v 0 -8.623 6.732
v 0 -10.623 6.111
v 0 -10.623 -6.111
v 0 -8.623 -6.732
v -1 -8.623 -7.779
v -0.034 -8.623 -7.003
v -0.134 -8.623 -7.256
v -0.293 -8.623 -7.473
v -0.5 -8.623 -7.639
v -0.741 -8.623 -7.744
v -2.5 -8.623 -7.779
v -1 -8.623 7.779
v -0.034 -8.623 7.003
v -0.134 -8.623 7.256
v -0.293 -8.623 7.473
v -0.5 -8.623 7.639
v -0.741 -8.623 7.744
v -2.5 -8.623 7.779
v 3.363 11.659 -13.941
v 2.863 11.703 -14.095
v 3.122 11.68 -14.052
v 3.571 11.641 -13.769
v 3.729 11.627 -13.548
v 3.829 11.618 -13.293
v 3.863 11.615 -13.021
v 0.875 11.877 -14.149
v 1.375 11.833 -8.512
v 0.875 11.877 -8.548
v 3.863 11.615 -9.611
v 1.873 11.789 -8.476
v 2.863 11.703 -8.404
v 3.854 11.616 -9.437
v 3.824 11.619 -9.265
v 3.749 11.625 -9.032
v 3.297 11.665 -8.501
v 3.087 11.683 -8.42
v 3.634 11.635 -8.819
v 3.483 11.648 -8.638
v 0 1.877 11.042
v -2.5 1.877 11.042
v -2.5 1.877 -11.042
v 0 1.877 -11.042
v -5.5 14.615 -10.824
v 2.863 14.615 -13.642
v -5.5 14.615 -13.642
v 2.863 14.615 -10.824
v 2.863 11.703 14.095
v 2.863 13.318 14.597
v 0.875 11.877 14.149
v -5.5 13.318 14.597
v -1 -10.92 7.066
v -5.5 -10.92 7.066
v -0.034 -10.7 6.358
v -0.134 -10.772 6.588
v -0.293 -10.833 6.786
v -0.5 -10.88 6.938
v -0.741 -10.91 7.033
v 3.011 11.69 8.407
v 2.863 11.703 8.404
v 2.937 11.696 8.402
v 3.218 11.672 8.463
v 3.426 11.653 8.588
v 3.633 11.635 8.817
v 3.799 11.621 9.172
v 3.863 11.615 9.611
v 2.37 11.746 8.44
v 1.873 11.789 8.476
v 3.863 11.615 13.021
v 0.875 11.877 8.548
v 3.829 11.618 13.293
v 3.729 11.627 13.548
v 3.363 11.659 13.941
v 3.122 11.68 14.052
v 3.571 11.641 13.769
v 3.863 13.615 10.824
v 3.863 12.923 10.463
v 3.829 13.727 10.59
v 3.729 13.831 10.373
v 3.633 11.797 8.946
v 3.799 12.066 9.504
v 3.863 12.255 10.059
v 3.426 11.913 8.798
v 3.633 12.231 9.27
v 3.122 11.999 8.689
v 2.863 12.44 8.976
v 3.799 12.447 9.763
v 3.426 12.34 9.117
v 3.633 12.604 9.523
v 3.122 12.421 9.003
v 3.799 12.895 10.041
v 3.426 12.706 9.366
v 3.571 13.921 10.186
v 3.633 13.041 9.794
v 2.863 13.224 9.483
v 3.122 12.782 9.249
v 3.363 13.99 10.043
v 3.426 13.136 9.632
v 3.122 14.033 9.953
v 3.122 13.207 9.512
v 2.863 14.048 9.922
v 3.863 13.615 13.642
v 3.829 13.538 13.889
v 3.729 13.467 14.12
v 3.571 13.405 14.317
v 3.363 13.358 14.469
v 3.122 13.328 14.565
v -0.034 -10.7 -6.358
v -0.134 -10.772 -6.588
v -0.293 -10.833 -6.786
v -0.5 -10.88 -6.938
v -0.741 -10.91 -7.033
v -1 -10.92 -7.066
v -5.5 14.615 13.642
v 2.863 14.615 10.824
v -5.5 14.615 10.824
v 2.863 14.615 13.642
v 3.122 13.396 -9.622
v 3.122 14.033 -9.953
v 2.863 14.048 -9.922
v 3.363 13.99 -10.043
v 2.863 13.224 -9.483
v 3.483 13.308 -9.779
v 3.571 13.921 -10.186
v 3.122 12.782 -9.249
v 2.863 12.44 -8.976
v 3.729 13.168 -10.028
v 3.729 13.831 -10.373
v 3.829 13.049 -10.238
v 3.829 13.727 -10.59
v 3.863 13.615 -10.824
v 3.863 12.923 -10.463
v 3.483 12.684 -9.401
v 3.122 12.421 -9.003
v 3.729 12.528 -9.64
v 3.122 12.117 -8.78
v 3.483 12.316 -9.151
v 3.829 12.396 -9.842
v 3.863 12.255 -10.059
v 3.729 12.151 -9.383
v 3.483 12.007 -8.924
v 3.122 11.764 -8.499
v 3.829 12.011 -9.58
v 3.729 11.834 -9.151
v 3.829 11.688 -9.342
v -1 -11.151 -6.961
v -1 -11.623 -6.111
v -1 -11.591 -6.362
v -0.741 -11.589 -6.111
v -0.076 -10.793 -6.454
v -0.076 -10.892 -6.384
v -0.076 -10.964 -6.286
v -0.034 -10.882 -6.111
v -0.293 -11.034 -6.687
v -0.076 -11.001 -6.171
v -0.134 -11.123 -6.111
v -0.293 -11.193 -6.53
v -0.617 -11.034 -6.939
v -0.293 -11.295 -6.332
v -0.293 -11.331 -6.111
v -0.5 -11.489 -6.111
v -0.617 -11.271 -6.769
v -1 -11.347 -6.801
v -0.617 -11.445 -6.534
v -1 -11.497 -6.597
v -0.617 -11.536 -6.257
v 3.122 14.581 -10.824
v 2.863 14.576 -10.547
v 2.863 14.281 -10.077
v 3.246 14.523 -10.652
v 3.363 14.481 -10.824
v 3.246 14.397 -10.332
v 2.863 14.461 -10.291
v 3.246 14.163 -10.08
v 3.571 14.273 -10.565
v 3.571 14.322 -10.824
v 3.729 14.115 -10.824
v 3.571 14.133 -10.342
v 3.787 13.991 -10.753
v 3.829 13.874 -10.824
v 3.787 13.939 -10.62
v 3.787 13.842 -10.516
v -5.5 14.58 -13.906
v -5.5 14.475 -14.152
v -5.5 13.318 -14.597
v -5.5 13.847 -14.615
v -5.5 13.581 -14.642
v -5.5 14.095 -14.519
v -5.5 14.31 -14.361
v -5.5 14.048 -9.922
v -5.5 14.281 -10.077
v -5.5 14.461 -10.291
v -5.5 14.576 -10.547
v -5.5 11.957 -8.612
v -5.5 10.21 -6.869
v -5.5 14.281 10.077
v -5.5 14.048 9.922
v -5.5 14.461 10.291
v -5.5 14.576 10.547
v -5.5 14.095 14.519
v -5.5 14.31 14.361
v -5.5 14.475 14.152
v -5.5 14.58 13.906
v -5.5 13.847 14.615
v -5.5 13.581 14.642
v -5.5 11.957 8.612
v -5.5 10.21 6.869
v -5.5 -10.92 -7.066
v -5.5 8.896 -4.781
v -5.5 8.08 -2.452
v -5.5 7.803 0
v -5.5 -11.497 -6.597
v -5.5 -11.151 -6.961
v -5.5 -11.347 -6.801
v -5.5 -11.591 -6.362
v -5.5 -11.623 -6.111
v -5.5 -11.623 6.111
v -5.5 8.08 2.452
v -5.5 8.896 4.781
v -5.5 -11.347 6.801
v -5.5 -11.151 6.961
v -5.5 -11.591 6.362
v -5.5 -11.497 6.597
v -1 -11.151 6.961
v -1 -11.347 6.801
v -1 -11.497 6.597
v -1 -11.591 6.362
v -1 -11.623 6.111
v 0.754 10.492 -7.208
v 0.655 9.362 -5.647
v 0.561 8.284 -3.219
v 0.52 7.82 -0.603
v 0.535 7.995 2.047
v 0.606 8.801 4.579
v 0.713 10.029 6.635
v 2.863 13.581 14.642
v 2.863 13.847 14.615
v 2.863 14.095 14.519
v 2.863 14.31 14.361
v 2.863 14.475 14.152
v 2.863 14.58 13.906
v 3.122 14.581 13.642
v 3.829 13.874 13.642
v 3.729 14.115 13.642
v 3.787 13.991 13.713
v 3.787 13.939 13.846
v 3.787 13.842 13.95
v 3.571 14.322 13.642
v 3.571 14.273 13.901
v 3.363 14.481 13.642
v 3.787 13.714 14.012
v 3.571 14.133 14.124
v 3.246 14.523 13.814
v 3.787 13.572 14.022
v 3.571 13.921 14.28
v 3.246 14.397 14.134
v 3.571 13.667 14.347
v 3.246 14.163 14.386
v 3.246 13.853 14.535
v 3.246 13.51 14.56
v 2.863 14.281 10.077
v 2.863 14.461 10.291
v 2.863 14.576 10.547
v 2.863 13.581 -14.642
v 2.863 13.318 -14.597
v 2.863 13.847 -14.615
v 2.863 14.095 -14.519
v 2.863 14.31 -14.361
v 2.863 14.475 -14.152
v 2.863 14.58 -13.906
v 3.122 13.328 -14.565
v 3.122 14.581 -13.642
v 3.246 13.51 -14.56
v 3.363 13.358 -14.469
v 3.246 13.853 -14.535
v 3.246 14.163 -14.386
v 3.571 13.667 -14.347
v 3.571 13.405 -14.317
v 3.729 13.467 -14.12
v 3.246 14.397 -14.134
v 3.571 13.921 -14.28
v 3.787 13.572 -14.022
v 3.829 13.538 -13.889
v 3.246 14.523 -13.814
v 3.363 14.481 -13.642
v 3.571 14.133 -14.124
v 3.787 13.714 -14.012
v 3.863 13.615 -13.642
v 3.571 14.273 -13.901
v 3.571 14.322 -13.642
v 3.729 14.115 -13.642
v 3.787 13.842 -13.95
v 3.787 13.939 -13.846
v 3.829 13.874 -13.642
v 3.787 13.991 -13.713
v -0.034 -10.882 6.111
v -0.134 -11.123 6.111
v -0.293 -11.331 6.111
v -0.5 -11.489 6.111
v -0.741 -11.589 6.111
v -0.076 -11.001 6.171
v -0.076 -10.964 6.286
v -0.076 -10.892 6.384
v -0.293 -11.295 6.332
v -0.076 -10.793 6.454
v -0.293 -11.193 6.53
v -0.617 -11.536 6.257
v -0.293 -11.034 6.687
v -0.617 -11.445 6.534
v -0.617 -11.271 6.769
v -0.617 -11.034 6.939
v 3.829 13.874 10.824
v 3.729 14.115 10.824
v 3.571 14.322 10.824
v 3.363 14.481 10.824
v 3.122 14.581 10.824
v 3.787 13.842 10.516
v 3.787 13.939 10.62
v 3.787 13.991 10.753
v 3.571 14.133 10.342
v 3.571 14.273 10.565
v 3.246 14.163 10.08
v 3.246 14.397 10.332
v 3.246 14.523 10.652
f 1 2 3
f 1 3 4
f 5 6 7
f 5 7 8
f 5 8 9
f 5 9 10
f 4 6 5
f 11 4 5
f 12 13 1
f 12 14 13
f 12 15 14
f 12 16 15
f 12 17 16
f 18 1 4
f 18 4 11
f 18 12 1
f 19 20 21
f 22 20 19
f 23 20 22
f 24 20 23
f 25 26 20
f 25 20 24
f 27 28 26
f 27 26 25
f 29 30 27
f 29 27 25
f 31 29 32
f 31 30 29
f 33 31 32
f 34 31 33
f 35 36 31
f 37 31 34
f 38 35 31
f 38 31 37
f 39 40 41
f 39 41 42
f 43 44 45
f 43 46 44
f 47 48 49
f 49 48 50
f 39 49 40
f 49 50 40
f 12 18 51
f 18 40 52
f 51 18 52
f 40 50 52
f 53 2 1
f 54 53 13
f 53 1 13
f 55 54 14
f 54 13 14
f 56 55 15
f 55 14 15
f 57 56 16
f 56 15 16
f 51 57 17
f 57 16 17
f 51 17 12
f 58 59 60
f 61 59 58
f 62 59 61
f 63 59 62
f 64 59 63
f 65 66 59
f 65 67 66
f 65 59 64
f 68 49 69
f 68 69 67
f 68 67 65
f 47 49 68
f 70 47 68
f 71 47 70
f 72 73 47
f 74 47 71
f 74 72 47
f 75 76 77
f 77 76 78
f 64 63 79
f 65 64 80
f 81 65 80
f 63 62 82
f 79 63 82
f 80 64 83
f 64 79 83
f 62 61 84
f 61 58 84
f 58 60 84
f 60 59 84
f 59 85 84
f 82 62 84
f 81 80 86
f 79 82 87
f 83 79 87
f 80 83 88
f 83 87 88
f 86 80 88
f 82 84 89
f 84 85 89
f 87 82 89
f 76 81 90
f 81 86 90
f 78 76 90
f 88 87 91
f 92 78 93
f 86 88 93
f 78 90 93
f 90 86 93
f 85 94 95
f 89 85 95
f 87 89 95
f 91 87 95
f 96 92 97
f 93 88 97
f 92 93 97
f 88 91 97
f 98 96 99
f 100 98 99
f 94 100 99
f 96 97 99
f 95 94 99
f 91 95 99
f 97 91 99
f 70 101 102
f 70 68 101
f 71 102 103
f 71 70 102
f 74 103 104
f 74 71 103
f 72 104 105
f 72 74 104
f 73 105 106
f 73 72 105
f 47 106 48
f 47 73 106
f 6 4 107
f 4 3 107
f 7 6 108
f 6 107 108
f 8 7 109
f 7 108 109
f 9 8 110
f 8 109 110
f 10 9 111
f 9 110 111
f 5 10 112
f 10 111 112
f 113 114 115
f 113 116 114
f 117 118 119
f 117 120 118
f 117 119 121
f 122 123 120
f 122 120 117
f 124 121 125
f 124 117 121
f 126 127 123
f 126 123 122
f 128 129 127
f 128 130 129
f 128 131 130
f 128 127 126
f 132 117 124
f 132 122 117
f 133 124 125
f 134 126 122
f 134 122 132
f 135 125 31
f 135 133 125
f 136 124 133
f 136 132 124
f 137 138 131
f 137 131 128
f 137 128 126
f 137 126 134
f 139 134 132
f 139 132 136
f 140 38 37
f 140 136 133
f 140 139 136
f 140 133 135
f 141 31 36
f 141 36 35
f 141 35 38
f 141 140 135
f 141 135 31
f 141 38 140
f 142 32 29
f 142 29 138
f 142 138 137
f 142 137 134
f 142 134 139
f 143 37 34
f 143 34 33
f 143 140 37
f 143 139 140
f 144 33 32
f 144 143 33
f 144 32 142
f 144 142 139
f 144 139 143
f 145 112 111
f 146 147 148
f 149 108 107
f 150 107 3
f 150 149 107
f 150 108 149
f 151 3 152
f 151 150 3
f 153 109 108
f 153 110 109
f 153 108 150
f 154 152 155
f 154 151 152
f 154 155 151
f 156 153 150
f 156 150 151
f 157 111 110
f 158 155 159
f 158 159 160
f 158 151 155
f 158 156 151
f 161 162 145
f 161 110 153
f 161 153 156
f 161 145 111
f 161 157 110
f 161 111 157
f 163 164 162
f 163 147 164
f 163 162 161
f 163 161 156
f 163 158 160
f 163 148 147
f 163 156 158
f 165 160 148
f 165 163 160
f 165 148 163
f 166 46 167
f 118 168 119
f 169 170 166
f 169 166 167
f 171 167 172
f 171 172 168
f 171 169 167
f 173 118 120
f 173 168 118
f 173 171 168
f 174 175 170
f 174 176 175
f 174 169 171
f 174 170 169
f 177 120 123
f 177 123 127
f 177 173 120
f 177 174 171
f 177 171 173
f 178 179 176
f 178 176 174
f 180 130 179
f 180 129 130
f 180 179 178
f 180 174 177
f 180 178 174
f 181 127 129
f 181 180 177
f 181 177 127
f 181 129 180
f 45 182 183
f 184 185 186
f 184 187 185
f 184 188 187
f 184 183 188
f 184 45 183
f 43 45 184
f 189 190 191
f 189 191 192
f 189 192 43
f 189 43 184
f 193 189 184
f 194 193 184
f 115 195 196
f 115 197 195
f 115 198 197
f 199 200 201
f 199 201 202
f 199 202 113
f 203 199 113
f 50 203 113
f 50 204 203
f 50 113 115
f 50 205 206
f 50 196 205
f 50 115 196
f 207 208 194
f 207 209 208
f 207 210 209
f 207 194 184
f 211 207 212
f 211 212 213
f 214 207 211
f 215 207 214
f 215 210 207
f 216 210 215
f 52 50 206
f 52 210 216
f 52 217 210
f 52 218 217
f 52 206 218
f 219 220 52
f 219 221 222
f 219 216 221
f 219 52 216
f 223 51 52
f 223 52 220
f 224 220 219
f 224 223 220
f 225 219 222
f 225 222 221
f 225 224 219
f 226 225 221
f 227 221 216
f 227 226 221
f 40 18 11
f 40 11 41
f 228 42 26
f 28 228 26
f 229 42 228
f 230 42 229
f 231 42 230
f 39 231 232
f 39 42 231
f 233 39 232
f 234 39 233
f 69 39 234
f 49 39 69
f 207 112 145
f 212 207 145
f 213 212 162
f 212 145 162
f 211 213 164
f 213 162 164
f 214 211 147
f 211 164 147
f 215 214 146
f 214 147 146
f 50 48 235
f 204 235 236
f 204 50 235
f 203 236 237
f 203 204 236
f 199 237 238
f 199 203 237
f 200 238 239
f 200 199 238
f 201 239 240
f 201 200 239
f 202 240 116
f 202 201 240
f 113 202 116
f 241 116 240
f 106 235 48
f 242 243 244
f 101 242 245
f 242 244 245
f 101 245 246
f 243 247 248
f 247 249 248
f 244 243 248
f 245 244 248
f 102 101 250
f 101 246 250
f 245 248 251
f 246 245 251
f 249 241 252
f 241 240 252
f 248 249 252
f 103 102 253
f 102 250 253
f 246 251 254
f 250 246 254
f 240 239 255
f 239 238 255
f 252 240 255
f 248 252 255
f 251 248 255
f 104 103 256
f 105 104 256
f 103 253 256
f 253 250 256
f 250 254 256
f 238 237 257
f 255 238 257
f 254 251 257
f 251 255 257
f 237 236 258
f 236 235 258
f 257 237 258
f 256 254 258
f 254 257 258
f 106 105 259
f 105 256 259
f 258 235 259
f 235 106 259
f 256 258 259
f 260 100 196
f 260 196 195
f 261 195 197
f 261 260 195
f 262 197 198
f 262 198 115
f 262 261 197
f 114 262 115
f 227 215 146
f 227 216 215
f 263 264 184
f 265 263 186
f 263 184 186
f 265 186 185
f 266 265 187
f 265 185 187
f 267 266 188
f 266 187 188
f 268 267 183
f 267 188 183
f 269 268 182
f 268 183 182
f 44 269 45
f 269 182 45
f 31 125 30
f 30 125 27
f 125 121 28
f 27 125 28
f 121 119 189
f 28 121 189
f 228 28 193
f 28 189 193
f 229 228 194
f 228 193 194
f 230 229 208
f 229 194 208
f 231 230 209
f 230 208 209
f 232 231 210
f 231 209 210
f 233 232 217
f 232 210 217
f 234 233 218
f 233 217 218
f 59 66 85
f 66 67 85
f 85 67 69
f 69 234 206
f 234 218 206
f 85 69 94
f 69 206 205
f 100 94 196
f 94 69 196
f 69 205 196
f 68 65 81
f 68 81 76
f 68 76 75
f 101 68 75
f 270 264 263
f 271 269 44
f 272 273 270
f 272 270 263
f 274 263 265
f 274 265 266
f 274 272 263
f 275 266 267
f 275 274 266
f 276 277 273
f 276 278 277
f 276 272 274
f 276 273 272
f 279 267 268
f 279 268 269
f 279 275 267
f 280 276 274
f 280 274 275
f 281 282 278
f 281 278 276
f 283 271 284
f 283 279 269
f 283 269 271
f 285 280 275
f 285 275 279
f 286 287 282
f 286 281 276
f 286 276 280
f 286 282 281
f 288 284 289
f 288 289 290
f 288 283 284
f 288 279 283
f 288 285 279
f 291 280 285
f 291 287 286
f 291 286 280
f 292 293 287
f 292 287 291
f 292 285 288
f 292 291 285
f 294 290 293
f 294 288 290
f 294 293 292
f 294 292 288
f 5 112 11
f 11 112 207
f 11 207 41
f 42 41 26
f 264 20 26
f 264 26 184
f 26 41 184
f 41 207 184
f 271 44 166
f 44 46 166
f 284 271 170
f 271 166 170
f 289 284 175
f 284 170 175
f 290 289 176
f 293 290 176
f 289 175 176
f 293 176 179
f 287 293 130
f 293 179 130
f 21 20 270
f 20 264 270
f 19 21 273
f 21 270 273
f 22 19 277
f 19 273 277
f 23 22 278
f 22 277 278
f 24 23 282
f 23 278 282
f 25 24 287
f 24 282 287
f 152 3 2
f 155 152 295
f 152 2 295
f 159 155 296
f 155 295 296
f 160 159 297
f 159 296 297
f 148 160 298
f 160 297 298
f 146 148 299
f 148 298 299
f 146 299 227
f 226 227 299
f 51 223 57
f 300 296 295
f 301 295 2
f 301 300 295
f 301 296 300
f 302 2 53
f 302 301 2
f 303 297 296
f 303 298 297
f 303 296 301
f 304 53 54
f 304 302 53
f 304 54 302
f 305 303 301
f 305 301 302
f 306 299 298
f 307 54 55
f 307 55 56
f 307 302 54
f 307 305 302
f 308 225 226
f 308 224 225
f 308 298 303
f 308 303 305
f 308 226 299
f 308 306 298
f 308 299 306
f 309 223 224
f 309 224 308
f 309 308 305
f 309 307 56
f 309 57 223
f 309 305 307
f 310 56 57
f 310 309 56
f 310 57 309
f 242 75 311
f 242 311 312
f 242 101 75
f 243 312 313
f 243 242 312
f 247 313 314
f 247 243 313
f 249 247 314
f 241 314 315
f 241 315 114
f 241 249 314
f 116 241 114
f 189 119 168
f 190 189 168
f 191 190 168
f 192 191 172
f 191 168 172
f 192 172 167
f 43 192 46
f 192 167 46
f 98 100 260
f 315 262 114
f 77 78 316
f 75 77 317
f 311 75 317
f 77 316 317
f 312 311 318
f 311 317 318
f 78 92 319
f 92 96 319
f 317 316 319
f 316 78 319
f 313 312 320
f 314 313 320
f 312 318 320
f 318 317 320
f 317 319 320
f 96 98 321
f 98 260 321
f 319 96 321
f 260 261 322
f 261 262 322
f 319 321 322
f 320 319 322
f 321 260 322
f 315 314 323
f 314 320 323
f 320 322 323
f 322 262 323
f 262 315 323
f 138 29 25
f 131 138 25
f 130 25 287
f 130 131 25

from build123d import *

# Parameters (mm, degrees)
F1_DEPTH = 15
F3_DEPTH = 9.3644707295
F4_R     = 1
F5_R     = 1


with BuildPart() as f1:
    # F0 (on Top) → F1 (new body, symmetric)
    with BuildSketch(Plane.XY):
        Polygon((0, 1.8765421212), (0.8748866353, 11.8765421212), (3.8634707295, 11.6150748929), (3.8634707295, 14.6150748929), (-5.5, 14.6150748929), (-5.5, -11.6234578788), (0, -11.6234578788), (0, -8.6234578788), (-2.5, -8.6234578788), (-2.5, 1.8765421212), align=None)
    extrude(amount=F1_DEPTH, both=True)

    # F2 (on face) → F3 (cut, through all)
    with BuildSketch(Plane(origin=(-5.5, 0, 0), x_dir=(0, -1, 0), z_dir=(-1, 0, 0))):
        Polygon((11.6234578788, -15), (11.6234578788, -6.8473624997), (-14.6150748929, -15), align=None)
        Polygon((11.6234578788, 15), (-14.6150748929, 15), (11.6234578788, 6.8473624997), align=None)
        with BuildLine():
            ThreePointArc((-14.6150748929, -10.1750748602), (-7.8033444248, 0), (-14.6150748929, 10.1750748602))
            Line((-14.6150748929, 10.1750748602), (-14.6150748929, -10.1750748602))
        make_face()
    extrude(amount=-F3_DEPTH, mode=Mode.SUBTRACT)

    # F4
    f4_edges = [f1.edges().sort_by_distance(p)[0] for p in [
        (-0.818265, 14.615075, 15),
        (-0.818265, 14.615075, -10.175075),
        (-0.818265, 14.615075, 10.175075),
        (-0.818265, 14.615075, -15),
        (-2.75, -11.623458, -6.847362),
        (-2.75, -11.623458, 6.847362),
    ]]
    fillet(f4_edges, radius=F4_R)

    # F5
    f5_edges = [f1.edges().sort_by_distance(p)[0] for p in [
        (3.863471, 14.615075, -12.232986),
        (3.863471, 14.615075, 12.232986),
        (0, -11.623458, 0),
    ]]
    fillet(f5_edges, radius=F5_R)


solid = f1.part
